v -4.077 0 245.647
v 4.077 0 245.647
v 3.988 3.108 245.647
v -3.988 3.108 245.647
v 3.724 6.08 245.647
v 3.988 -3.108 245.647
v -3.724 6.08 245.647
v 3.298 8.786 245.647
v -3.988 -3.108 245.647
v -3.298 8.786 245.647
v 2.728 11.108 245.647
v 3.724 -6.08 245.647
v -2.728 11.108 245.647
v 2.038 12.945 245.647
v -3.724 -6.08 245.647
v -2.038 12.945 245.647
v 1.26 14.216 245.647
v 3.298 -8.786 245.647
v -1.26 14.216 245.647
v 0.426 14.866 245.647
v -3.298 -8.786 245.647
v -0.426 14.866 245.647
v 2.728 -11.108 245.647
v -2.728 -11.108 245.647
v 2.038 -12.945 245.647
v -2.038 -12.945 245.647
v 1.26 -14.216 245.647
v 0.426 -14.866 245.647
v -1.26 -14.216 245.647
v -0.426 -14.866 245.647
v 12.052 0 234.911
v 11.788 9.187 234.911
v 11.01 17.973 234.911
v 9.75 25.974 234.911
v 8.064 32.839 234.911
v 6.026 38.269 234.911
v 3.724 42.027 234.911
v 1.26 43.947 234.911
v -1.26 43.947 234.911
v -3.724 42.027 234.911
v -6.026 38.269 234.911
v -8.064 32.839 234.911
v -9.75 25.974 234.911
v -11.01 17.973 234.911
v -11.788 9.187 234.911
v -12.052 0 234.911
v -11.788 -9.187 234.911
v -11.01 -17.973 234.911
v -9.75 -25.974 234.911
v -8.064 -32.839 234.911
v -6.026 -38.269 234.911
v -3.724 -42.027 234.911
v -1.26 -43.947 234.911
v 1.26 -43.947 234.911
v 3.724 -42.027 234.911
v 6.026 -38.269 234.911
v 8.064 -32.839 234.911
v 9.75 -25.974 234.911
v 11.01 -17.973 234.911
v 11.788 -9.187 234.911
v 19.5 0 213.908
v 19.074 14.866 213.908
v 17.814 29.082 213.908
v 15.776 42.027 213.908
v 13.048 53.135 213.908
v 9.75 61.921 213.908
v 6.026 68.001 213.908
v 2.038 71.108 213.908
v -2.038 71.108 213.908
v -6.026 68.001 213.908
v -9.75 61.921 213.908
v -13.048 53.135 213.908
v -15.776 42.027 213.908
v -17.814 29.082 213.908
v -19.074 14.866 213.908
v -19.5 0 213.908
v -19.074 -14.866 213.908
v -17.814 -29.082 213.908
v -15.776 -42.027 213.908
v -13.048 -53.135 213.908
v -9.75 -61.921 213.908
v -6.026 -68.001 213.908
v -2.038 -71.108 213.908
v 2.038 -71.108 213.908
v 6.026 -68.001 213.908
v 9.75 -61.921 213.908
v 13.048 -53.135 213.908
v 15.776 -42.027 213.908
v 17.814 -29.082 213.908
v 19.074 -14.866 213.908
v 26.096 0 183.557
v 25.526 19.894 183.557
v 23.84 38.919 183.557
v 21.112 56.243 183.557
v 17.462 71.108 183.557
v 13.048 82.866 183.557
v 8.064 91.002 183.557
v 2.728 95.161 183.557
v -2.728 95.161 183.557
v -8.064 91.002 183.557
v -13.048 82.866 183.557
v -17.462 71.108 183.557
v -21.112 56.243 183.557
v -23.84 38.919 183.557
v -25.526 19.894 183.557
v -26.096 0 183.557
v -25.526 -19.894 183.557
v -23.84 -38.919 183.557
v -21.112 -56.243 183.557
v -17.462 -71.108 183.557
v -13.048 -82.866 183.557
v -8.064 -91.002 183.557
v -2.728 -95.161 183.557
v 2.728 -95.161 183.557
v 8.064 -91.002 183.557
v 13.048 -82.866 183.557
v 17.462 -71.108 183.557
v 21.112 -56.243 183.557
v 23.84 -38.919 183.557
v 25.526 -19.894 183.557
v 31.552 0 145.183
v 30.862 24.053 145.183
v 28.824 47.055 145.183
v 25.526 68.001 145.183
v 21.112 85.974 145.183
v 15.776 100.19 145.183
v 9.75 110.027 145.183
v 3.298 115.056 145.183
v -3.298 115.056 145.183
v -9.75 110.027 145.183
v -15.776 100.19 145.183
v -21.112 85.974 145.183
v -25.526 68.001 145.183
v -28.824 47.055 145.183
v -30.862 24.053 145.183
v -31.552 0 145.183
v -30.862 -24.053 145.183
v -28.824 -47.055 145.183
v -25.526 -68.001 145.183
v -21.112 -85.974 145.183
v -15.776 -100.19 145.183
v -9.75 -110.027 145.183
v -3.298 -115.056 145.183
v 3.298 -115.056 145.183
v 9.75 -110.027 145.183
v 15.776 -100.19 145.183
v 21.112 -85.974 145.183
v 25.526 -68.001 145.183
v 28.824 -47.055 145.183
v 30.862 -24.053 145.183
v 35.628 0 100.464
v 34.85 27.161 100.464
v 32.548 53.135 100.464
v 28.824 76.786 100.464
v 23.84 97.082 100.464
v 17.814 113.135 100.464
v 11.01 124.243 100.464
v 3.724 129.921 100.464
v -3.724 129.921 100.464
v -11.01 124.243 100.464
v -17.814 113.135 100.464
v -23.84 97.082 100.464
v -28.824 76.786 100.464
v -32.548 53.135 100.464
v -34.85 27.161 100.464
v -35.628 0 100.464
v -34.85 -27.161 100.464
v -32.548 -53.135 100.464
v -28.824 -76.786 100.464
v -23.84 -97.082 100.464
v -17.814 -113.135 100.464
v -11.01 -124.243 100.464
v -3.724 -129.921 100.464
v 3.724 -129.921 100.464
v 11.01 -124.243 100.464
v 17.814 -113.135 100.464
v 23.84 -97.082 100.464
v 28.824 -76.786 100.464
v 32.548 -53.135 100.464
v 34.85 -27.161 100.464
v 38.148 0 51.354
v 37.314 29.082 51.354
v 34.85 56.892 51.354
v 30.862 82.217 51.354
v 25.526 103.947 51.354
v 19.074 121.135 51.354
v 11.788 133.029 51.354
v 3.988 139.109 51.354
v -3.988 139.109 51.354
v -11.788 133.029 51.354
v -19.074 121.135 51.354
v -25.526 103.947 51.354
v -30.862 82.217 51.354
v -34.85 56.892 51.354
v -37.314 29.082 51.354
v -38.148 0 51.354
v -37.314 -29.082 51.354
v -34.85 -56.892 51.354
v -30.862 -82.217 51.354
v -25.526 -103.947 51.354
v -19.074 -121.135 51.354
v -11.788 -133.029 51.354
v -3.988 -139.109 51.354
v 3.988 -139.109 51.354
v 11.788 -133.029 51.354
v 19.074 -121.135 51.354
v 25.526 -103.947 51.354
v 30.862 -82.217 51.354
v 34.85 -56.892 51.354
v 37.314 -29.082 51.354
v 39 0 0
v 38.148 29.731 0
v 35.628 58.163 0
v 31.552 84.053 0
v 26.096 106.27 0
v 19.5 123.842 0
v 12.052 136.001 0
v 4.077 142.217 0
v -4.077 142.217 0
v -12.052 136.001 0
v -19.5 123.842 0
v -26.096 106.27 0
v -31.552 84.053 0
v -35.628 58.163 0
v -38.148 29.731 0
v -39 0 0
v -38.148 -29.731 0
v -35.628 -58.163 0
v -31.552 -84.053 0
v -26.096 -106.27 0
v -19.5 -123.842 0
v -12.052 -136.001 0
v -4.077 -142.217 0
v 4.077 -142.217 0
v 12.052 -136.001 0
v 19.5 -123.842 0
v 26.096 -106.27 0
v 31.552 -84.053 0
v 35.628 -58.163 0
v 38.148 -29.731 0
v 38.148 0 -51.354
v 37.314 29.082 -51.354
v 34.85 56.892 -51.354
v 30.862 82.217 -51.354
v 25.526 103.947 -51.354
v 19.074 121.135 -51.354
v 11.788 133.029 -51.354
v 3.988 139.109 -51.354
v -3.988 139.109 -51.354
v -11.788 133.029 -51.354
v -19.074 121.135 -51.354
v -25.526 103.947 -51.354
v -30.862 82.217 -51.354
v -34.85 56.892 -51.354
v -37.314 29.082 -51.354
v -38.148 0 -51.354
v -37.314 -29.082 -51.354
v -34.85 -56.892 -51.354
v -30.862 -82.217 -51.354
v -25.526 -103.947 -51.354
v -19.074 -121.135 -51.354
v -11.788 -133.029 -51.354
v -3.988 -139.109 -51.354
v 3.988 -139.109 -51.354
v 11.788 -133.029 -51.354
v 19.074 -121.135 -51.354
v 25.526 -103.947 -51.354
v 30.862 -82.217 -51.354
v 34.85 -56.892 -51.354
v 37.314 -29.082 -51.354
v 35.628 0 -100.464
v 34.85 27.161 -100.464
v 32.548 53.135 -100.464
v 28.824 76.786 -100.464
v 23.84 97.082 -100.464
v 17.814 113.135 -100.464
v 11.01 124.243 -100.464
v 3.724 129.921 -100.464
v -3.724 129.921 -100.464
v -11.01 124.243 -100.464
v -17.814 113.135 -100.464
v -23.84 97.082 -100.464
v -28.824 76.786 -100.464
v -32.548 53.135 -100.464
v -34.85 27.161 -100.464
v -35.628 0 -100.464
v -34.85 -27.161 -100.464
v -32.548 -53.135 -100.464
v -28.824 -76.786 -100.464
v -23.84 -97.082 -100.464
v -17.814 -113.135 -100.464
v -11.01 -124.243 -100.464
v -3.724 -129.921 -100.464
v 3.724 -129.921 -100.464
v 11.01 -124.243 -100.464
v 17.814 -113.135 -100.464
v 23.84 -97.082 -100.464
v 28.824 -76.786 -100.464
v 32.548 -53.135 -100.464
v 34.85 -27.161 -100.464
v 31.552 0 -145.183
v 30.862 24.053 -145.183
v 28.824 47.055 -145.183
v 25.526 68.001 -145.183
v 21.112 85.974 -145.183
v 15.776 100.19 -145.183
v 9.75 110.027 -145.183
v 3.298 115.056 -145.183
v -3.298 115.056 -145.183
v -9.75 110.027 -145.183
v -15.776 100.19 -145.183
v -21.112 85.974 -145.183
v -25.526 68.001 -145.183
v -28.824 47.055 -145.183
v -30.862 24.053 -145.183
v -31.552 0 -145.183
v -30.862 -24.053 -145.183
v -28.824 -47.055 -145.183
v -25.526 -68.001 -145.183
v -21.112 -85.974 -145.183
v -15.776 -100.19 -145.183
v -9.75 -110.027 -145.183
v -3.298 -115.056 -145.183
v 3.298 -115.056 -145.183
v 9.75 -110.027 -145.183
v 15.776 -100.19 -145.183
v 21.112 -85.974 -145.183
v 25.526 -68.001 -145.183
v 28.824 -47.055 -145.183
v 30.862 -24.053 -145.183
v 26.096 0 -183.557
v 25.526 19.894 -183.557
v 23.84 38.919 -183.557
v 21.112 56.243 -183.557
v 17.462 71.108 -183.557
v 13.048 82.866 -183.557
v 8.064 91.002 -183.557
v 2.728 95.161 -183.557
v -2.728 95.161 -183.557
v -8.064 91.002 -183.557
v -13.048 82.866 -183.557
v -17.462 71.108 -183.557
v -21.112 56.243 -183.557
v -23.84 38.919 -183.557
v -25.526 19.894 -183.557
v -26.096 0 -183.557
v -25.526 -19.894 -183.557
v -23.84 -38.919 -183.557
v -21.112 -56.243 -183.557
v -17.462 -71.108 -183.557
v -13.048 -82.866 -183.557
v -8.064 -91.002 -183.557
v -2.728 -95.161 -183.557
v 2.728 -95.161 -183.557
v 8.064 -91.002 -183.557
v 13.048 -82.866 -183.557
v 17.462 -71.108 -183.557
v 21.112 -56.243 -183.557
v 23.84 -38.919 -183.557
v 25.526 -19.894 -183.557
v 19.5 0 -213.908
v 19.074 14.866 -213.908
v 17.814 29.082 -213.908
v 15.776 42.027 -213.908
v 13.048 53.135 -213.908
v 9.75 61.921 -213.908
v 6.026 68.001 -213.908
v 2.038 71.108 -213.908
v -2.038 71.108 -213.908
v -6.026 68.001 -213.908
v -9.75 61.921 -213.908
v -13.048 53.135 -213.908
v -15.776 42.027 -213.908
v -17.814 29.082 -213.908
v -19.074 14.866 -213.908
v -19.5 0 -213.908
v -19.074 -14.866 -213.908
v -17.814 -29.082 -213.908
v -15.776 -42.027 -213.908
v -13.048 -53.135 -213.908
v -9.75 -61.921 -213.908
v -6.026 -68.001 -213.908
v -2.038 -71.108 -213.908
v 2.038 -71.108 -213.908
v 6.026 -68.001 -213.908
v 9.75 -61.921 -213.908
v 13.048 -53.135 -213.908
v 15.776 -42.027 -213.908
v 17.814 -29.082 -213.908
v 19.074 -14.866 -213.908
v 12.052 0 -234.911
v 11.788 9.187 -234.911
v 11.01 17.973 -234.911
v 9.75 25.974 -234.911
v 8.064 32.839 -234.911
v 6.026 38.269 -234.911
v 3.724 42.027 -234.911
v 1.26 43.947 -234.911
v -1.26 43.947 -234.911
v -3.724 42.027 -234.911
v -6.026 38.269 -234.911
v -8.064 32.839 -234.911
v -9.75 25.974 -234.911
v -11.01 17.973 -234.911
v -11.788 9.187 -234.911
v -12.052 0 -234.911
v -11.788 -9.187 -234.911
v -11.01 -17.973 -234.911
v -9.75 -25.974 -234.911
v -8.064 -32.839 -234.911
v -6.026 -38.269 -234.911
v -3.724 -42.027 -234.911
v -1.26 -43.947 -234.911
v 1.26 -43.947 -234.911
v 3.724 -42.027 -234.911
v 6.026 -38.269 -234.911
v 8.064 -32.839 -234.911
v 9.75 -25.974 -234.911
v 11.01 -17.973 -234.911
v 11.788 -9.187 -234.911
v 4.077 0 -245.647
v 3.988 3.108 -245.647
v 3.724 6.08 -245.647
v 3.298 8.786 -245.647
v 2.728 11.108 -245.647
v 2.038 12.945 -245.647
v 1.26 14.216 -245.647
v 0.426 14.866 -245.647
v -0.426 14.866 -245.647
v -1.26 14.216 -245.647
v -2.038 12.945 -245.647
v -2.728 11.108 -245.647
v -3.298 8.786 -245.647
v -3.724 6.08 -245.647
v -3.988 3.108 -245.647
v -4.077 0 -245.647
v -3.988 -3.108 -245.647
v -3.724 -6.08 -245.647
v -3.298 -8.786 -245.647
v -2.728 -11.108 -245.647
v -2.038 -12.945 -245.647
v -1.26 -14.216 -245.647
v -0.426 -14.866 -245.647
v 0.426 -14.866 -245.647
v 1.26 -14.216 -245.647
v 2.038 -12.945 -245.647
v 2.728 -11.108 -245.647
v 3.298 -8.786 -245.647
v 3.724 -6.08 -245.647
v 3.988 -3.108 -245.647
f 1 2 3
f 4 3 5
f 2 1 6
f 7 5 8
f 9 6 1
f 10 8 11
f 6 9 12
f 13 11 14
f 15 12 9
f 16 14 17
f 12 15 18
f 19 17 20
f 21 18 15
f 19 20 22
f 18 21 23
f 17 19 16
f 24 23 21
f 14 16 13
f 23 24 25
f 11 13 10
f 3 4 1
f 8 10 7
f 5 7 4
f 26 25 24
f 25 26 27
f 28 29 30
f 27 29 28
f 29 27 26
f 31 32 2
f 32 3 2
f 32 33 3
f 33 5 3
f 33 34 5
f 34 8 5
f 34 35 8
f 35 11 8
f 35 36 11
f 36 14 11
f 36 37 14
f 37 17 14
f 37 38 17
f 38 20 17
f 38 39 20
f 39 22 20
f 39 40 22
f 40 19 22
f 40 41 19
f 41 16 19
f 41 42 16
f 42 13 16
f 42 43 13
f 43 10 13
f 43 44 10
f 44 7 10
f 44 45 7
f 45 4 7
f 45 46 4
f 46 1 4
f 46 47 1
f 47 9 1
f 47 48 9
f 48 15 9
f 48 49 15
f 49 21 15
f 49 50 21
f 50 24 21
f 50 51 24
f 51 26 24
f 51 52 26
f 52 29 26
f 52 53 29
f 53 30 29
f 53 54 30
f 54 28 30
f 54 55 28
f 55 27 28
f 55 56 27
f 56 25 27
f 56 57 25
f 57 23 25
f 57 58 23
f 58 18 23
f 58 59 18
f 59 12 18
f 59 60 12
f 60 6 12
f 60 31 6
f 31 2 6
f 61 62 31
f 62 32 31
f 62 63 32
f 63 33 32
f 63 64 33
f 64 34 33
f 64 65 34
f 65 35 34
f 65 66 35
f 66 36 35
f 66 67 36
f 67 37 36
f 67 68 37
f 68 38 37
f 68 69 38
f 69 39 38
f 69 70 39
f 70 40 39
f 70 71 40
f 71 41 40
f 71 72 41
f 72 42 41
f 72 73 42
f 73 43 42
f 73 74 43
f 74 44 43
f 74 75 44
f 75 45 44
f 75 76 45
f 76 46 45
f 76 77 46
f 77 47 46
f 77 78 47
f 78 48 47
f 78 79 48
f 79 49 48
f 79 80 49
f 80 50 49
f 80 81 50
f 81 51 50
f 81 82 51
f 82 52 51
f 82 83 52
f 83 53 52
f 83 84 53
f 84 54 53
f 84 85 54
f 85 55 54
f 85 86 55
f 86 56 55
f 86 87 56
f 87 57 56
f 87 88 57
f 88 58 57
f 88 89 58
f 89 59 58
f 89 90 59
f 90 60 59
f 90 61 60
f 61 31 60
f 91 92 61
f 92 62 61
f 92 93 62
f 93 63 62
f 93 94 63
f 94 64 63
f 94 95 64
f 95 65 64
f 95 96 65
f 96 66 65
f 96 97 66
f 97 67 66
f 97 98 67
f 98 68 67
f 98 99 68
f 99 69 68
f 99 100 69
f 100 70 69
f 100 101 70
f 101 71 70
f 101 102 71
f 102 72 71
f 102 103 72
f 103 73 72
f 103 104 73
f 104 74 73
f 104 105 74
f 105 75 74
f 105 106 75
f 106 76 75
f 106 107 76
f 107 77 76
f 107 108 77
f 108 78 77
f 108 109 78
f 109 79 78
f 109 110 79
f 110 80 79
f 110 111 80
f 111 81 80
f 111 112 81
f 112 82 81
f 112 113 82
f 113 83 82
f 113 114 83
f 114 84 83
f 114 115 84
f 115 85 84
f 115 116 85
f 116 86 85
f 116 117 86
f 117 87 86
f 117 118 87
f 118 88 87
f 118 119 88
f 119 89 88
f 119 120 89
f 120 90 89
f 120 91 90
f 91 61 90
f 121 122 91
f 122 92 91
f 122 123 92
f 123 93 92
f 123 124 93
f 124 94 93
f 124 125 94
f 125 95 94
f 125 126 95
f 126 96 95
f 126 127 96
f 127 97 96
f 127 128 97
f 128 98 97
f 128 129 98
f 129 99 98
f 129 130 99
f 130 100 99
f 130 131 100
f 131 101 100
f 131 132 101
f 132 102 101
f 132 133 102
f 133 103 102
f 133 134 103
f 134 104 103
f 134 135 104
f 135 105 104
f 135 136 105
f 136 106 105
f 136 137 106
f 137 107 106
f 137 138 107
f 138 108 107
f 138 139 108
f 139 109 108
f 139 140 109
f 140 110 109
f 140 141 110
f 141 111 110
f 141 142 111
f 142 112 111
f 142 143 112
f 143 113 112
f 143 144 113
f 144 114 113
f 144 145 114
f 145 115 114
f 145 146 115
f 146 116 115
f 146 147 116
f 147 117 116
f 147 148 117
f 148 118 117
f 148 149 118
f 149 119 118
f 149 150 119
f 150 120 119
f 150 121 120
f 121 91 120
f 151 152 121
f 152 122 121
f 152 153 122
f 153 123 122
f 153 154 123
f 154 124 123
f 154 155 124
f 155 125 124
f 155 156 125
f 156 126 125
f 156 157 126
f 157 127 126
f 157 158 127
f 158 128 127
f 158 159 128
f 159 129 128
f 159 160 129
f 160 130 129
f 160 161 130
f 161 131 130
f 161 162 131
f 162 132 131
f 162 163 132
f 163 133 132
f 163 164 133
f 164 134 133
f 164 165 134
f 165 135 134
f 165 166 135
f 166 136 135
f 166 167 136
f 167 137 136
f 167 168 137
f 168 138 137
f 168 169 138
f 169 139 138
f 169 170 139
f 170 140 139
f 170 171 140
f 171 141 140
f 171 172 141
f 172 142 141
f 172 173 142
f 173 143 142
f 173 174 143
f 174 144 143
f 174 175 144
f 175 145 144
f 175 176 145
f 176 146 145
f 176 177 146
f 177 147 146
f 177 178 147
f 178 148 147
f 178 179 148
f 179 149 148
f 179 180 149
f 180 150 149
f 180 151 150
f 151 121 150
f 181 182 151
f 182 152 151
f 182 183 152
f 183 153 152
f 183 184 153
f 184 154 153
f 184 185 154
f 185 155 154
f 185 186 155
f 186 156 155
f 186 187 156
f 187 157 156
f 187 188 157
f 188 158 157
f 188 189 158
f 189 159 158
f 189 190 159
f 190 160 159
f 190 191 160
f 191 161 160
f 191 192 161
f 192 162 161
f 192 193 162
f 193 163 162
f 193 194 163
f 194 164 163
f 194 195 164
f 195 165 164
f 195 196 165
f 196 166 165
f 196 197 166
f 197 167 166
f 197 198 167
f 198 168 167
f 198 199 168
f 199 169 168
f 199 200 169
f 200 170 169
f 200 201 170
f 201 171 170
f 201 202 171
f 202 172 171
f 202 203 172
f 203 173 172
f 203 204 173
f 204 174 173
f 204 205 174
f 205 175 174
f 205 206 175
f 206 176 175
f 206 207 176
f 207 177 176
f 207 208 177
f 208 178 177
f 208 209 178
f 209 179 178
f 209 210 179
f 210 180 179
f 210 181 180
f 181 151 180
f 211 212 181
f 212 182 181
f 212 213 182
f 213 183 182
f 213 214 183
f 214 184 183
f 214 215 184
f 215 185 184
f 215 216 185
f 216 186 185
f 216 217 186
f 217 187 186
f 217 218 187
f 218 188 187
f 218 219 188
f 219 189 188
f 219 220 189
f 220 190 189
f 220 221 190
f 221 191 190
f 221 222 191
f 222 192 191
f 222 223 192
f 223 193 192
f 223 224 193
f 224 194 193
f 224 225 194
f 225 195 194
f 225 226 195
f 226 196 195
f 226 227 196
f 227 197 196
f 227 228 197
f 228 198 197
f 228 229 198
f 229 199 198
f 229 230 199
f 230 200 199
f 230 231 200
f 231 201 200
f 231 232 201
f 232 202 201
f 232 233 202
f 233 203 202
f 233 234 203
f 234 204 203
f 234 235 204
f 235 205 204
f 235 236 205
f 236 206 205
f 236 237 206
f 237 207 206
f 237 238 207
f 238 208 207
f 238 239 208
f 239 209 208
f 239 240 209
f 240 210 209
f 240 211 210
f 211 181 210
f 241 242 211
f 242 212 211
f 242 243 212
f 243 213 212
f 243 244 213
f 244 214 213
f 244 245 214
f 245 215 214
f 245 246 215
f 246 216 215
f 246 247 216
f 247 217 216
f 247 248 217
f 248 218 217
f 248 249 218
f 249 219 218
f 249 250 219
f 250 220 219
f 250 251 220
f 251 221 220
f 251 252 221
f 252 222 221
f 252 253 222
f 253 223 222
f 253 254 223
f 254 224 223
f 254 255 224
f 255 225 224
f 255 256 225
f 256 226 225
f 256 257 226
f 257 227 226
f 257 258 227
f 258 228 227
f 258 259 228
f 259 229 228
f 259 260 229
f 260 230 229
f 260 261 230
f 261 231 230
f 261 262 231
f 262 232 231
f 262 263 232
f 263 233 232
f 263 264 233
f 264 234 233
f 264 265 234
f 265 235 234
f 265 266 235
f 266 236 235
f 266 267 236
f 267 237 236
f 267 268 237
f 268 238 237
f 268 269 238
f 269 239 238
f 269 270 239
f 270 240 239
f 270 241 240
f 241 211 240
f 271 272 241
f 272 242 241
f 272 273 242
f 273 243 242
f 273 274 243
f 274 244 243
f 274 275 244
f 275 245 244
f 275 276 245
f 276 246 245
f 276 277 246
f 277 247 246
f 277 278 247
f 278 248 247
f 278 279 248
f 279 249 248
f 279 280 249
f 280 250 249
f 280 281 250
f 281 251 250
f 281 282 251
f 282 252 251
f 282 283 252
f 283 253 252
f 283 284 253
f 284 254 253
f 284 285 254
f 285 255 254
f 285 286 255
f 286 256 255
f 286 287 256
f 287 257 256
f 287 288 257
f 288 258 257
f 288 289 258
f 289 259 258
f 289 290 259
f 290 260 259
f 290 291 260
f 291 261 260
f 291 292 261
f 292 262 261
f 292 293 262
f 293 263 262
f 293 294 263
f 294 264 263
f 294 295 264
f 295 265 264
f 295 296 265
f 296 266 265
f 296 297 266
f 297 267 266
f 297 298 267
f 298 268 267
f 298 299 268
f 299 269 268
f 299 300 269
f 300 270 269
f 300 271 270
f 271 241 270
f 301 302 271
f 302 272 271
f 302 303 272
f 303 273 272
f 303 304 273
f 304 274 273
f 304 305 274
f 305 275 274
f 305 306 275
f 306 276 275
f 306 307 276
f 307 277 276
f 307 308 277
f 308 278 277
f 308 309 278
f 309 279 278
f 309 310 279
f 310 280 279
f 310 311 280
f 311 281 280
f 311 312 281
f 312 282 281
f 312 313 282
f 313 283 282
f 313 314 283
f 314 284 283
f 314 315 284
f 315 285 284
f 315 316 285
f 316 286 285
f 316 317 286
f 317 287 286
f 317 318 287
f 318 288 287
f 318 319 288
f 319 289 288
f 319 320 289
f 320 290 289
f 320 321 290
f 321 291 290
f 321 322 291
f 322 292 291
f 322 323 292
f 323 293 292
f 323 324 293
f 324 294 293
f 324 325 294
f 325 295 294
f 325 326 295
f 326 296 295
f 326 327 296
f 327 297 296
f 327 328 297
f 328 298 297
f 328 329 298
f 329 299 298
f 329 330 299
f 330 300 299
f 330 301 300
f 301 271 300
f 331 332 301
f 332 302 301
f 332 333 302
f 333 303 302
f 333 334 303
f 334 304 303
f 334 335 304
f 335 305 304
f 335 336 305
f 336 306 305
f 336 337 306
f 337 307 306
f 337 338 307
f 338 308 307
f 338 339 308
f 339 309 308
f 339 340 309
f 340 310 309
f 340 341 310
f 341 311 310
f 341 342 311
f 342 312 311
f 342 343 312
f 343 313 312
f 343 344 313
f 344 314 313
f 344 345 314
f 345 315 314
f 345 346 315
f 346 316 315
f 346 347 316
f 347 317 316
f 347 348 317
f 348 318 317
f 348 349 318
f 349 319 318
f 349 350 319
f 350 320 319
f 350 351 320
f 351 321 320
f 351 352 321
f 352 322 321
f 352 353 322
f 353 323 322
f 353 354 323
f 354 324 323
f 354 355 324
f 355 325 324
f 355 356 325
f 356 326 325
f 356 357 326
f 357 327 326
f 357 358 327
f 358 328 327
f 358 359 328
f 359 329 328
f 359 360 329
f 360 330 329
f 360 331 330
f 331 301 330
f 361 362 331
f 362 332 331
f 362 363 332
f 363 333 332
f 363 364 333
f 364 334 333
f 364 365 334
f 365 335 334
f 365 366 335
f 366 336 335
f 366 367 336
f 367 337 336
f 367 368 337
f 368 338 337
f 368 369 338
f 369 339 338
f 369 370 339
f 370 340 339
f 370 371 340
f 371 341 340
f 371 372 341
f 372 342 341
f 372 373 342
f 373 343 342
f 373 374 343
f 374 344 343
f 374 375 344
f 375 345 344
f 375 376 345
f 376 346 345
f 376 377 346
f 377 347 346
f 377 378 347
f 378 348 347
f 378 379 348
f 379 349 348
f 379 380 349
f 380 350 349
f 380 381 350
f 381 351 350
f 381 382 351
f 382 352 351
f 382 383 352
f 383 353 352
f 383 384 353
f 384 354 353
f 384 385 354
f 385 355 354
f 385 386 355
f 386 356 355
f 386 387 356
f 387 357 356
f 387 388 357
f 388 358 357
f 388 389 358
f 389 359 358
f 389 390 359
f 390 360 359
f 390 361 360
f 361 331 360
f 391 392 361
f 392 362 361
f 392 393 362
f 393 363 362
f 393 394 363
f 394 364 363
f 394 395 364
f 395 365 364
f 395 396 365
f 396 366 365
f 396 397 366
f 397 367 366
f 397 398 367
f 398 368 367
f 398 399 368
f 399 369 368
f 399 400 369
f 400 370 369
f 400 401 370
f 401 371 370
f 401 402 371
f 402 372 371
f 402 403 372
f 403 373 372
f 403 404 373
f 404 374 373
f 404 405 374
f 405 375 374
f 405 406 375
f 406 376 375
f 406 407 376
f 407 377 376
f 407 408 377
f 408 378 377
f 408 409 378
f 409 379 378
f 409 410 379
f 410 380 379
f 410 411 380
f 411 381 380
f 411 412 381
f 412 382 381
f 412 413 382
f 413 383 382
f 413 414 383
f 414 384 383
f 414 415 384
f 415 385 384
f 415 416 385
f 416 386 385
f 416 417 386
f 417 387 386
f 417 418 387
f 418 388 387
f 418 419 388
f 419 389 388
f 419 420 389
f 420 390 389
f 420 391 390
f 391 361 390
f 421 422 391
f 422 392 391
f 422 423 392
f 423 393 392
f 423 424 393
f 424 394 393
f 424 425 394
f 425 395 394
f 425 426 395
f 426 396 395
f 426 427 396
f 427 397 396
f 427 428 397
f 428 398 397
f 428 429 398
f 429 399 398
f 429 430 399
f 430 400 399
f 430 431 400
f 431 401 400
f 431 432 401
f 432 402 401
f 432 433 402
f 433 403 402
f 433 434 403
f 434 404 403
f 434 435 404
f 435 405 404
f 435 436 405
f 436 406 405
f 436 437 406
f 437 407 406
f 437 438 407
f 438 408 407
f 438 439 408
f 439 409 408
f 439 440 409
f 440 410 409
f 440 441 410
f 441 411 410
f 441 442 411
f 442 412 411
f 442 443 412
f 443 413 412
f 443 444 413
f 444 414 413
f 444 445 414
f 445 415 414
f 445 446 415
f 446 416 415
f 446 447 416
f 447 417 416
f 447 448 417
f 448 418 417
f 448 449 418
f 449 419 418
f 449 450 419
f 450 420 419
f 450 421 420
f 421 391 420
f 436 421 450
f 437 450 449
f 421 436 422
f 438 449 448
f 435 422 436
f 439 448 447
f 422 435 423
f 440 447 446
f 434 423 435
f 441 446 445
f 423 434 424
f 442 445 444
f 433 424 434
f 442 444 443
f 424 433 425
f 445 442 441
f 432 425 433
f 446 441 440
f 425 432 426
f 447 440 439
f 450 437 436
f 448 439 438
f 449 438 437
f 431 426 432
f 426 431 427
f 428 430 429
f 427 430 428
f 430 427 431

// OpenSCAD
// Generated by SolidPython 1.0.1 on 2020-07-29 00:46:45


scale(v = [3, 11, 19]) {
	sphere(r = 13);
}
/***********************************************
*********      SolidPython code:      **********
************************************************
 
# import packages: SolidPython
from solid import *
from solid.utils import *
from itertools import chain, combinations, permutations


class Resize:

    def __init__(self, scad_file):
        self.scad_file = scad_file
        #self.scad_file = import_scad(scad_file)
        # cone/cylinder param:
        self.r1 = 0
        self.r2 = 0
        self.h = 0
        # rectangular prism param:
        self.w = 0
        self.l = 0
        # ellipse param:
        self.r = 0

    # import OpenScad code (file name corresponds to shape)


    # classify shape + parameters
    def assign(self, param1, param2, param3):
        if self.scad_file == 'cone.scad':
            self.r1 = param1
            self.r2 = param2
            self.h = param3
        elif self.scad_file == 'cylinder.scad':
            self.r1 = param1
            self.r2 = param2
            self.h = param3
        elif self.scad_file == 'rectangularPrism.scad':
            self.h = param1
            self.l = param2
            self.w = param3
        else:
            self.r = param1
            self.h = param2

    # resize parameters
    def iterate(self):
        x = range(3, 20, 2)
        i = 1
        if self.scad_file == 'cone.scad':
            tempList = list(permutations(x, 2))
            for temp in tempList:
                param1 = temp[0]
                param2 = temp[1]
                filepath = 'produced_scad_files/' + 'cone' + str(param1) + '_' + str(param2) + '_' + '.scad'
                scad_render_to_file(cylinder(h=param1, r1=param2, r2=0), filepath)

        elif self.scad_file == 'cylinder.scad':
            tempList = list(permutations(x, 3))
            for temp in tempList:
                param1 = temp[0]
                param2 = temp[1]
                filepath = 'produced_scad_files/' + 'cylinder' + str(param1) + '_' + str(param2) + '_' + '.scad'
                scad_render_to_file(cylinder(h=param1, r1=param2, r2=param2), filepath)

        elif self.scad_file == 'rectangularPrism.scad':
            tempList = list(permutations(x, 3))
            for temp in tempList:
                param1 = temp[0]
                param2 = temp[1]
                param3 = temp[2]
                filepath = 'produced_scad_files/' + 'rectangularPrism' + str(param1) + '_' + str(param2) + '_' + str(
                    param3) + '.scad'
                scad_render_to_file(cube(size=(param1, param2, param3)), filepath)

        elif self.scad_file == 'ellipse.scad':
            tempList = list(permutations(x, 4))
            for temp in tempList:
                param1 = temp[0]
                param2 = temp[1]
                param3 = temp[2]
                param4 = temp[3]
                filepath = 'produced_scad_files/' + 'ellipse' + str(param1) + '_' + str(param2) + '_' + str(param3) + '_' + str(param4) + '.scad'
                scad_render_to_file(scale([param1, param2, param3])(sphere(r=param4)), filepath)

    def render_to_scadfile(self):
        scad_render_to_file(scad, 'example.scad') 
 
************************************************/
